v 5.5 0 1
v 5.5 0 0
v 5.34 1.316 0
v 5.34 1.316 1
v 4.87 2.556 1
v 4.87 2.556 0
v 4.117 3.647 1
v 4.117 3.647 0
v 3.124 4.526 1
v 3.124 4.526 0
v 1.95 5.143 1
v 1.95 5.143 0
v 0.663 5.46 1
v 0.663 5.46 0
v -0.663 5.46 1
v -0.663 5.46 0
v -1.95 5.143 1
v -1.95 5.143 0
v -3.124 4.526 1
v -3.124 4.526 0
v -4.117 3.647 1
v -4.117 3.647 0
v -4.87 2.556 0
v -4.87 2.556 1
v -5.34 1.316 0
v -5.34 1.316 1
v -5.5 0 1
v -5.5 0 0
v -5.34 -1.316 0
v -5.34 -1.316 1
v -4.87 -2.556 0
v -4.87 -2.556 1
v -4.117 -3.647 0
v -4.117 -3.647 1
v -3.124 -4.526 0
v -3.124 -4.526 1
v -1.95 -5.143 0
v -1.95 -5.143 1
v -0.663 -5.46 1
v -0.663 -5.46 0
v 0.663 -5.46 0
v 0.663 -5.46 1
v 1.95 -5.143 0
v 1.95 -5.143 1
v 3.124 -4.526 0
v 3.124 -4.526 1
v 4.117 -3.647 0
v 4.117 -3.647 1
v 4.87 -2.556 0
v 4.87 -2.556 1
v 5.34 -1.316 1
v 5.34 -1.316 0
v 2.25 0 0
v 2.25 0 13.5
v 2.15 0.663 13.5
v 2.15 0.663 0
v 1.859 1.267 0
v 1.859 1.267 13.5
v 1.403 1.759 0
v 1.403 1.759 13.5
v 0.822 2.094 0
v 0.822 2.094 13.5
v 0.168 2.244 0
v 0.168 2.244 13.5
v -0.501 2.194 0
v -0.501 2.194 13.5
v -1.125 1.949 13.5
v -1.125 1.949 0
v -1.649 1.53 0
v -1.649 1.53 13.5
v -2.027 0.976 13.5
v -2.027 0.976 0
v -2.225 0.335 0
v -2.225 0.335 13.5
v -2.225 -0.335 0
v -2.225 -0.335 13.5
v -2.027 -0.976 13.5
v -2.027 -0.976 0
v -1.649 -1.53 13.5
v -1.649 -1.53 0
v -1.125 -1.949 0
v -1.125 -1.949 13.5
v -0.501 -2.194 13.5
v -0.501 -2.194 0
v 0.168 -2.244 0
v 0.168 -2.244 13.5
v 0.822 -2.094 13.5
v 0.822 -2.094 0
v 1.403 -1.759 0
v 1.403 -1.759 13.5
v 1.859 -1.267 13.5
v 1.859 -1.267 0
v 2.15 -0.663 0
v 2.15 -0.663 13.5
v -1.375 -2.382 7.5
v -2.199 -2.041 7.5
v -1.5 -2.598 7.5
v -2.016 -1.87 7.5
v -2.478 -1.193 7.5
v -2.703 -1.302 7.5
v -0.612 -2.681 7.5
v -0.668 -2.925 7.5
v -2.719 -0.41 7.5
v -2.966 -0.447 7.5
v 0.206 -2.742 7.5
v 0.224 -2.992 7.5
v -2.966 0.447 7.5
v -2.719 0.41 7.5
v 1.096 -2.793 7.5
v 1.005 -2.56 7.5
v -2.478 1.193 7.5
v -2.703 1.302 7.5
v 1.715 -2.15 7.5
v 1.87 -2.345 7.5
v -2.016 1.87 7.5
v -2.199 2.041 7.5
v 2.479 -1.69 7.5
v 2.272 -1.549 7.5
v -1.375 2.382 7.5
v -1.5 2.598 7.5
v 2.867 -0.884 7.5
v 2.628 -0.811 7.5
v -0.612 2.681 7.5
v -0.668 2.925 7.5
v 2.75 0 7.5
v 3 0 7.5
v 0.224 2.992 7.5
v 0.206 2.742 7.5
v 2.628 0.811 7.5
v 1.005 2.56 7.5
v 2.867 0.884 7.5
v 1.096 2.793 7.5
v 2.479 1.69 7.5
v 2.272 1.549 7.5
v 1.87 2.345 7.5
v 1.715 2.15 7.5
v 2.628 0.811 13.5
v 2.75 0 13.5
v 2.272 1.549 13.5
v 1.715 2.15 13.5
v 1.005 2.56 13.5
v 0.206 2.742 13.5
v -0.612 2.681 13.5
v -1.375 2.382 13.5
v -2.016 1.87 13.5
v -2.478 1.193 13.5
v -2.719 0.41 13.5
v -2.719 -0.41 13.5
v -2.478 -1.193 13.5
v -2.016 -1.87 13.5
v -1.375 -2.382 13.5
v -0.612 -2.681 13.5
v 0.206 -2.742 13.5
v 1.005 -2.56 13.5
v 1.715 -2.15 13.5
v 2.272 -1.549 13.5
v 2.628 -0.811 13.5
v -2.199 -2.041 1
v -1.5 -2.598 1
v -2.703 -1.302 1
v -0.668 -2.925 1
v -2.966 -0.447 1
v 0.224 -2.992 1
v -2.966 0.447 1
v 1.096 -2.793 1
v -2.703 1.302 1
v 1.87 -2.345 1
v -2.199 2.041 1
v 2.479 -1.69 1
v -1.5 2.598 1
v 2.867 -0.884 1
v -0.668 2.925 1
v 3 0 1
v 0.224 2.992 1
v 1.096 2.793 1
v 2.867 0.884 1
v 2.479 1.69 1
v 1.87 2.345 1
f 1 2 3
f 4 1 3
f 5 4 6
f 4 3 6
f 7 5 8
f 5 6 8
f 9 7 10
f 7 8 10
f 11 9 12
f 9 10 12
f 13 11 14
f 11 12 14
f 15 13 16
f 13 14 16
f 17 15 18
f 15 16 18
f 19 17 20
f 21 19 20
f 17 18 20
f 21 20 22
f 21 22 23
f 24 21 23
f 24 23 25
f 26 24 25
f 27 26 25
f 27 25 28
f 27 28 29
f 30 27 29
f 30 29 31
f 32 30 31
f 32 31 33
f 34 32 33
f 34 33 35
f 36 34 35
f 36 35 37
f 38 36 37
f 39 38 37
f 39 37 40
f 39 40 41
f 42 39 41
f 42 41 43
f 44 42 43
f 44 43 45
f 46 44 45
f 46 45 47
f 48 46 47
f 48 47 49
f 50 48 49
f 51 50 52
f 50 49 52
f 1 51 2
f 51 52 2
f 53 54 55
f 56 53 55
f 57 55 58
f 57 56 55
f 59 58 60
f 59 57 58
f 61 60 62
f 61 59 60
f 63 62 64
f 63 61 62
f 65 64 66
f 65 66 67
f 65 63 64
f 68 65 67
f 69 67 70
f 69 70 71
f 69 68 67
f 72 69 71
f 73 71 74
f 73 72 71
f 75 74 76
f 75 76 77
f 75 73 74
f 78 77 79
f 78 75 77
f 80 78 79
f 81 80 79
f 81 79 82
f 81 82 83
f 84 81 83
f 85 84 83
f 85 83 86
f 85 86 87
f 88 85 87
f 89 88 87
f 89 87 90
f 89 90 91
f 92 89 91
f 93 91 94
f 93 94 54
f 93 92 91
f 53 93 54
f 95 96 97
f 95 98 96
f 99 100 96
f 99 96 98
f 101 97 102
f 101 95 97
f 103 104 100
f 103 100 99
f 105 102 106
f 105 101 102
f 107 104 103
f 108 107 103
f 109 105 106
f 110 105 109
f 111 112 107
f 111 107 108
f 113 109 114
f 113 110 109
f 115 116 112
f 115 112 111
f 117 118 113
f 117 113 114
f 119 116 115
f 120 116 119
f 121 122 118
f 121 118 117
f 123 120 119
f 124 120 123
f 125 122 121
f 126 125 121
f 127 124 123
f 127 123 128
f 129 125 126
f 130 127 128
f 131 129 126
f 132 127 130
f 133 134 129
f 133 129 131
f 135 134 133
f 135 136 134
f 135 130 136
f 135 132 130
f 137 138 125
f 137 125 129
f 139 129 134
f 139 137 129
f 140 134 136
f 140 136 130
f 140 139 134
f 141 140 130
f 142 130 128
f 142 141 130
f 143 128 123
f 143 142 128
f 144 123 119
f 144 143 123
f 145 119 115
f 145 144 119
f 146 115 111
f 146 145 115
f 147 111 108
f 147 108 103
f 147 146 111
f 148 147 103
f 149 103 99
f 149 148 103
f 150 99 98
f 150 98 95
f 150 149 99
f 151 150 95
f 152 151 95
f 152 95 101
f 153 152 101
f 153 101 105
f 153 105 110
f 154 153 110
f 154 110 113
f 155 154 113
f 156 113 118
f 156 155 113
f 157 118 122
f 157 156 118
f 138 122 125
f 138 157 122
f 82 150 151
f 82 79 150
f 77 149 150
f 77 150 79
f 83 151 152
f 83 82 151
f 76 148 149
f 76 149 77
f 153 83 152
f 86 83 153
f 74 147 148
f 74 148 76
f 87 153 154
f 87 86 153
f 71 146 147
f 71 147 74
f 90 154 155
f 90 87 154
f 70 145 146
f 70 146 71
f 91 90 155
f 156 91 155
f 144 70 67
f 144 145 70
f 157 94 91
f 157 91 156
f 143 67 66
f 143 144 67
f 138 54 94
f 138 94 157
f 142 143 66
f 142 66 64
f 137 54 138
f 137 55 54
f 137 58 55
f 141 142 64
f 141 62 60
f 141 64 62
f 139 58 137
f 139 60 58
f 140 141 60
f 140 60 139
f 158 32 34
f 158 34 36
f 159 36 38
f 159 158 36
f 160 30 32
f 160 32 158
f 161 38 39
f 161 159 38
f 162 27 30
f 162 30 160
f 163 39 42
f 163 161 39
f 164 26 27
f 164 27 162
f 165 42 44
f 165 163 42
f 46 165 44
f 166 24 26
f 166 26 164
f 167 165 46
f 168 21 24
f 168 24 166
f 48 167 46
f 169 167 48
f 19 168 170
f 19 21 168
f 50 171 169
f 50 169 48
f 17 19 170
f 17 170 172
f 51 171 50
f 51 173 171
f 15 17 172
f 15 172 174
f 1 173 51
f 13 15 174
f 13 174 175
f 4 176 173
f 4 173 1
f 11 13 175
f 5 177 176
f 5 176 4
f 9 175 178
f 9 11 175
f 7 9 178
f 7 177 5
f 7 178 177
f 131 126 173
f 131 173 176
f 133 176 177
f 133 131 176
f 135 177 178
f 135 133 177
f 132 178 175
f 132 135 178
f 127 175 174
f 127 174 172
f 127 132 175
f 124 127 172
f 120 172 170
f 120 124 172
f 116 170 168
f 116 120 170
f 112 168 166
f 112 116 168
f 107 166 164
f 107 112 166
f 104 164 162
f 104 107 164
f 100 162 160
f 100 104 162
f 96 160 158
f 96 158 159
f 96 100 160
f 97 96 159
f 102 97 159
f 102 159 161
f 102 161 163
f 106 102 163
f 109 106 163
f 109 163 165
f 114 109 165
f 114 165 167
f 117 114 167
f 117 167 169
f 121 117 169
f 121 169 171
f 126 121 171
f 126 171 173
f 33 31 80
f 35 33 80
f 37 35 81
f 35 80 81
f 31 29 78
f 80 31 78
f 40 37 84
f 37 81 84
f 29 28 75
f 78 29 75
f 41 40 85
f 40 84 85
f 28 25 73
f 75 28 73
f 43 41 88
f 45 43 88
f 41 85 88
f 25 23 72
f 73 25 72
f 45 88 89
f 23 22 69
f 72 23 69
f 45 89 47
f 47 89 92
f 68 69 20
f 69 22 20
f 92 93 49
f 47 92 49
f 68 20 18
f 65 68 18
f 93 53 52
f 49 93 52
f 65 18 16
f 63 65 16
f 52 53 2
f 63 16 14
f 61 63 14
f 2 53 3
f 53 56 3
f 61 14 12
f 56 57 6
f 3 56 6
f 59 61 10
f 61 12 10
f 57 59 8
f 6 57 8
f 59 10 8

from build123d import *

# Parameters (mm, degrees)
F0_R     = 5.5
F0_R_2   = 2.25
F1_DEPTH = 13.5
F2_R     = 5.5
F2_R_2   = 3
F3_DEPTH = 12.5
F4_R     = 3
F4_R_2   = 2.75
F5_DEPTH = 6


with BuildPart() as f1:
    # F0 (on Top) → F1 (new body)
    with BuildSketch(Plane.XY):
        Circle(F0_R)
        Circle(F0_R_2, mode=Mode.SUBTRACT)
    extrude(amount=F1_DEPTH)

    # F2 (on face) → F3 (cut)
    with BuildSketch(Plane.XY.offset(13.5)):
        Circle(F2_R)
        Circle(F2_R_2, mode=Mode.SUBTRACT)
    extrude(amount=-F3_DEPTH, mode=Mode.SUBTRACT)

    # F4 (on face) → F5 (cut)
    with BuildSketch(Plane.XY.offset(13.5)):
        Circle(F4_R)
        Circle(F4_R_2, mode=Mode.SUBTRACT)
    extrude(amount=-F5_DEPTH, mode=Mode.SUBTRACT)


solid = f1.part
